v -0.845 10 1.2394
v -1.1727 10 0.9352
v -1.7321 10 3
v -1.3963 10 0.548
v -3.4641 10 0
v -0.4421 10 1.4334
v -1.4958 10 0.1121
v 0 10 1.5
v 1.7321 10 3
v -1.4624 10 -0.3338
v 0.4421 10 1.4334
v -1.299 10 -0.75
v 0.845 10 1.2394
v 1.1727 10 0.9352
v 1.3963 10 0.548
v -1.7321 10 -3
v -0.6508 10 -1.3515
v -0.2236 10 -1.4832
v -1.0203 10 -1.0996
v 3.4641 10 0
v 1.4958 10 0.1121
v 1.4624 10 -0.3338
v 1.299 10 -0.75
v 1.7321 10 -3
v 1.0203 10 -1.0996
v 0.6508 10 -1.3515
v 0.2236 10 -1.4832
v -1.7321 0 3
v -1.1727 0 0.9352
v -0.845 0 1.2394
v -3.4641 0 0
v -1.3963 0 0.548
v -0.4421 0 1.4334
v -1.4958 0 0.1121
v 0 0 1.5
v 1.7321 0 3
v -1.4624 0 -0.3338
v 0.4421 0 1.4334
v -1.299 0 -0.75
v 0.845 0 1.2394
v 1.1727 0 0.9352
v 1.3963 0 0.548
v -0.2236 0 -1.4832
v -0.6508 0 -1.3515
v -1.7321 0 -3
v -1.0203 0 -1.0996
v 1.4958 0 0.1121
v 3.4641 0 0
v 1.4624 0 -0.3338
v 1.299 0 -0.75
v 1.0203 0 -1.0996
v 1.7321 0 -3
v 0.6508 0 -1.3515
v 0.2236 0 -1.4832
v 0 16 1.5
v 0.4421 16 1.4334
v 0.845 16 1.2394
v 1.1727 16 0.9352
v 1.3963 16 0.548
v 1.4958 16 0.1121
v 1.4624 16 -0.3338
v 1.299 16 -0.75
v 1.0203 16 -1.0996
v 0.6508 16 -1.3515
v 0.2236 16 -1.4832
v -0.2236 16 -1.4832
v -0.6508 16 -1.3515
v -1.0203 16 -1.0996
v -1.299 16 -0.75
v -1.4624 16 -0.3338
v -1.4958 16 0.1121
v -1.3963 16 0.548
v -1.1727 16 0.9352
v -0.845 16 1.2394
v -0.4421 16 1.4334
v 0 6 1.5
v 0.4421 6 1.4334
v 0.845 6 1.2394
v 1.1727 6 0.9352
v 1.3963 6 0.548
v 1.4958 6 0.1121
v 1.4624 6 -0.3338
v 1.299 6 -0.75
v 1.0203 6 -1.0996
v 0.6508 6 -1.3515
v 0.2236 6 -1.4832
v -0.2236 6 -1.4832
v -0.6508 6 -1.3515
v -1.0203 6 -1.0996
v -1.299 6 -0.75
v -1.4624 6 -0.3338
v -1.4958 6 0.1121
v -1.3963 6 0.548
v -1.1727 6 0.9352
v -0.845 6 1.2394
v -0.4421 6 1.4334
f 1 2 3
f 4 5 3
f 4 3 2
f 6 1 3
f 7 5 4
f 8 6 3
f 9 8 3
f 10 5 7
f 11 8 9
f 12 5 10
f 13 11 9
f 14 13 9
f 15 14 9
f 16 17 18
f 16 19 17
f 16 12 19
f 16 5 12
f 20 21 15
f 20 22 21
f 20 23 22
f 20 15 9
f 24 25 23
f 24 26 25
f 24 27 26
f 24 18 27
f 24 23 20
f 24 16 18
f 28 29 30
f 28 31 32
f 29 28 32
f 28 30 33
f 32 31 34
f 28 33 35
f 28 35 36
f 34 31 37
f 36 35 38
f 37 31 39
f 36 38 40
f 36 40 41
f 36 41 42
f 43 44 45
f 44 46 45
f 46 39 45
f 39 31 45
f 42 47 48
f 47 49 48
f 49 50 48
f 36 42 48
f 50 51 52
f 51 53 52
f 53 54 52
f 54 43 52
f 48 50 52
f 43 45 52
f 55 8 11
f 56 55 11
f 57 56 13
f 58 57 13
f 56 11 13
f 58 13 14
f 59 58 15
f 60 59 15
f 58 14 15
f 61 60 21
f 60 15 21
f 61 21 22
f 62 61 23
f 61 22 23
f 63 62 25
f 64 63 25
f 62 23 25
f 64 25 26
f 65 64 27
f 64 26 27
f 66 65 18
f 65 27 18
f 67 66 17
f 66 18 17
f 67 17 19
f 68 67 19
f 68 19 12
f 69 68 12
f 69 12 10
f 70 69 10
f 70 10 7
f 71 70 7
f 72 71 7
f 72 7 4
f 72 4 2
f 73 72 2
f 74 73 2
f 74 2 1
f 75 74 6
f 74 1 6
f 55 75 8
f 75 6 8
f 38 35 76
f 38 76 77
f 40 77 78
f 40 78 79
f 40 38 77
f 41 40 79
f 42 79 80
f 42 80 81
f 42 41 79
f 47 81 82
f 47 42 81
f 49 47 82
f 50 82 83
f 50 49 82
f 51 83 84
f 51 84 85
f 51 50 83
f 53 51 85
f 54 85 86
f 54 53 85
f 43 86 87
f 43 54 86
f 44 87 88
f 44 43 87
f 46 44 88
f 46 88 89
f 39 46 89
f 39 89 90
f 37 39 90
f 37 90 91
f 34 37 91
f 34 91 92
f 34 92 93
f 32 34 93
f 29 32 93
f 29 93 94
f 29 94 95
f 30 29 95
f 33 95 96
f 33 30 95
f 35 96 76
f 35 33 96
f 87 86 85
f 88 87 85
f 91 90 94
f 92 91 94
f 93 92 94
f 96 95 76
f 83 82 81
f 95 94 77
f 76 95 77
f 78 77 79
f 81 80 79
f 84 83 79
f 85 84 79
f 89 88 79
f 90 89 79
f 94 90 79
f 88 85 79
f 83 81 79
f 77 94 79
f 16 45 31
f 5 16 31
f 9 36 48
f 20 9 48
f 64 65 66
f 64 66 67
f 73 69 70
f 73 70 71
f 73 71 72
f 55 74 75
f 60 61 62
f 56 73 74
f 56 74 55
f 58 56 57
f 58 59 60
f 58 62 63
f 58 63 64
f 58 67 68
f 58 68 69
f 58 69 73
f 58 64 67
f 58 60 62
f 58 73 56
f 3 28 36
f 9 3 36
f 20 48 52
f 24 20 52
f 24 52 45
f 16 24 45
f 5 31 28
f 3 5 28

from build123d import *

# Parameters (mm, degrees)
BOSS_EXTRUDE1_DEPTH = 10
SKETCH2_R           = 1.5
BOSS_EXTRUDE2_DEPTH = 6
CUT_EXTRUDE1_START  = -10
SKETCH2_2_R         = 1.5
CUT_EXTRUDE1_DEPTH  = 6


with BuildPart() as part:
    # Sketch1 → Boss-Extrude1 (new body)
    with BuildSketch(Plane(origin=(0, 0, 0), x_dir=(1, 0, 0), z_dir=(0, 1, 0))):
        Polygon((1.732050808, -3), (3.464101615, 0), (1.732050808, 3), (-1.732050808, 3), (-3.464101615, 0), (-1.732050808, -3), align=None)
    extrude(amount=BOSS_EXTRUDE1_DEPTH)

    # Sketch2 → Boss-Extrude2 (add)
    with BuildSketch(Plane(origin=(0, 10, 0), x_dir=(1, 0, 0), z_dir=(0, 1, 0))):
        with Locations(Location((0, 0, 0), (0, 0, 270))):
            Circle(SKETCH2_R)
    extrude(amount=BOSS_EXTRUDE2_DEPTH)

    # Sketch2<2> → Cut-Extrude1 (cut)
    with BuildSketch(Plane(origin=(0, 10, 0), x_dir=(1, 0, 0), z_dir=(0, 1, 0)).offset(CUT_EXTRUDE1_START)):
        with Locations(Location((0, 0, 0), (0, 0, 270))):
            Circle(SKETCH2_2_R)
    extrude(amount=CUT_EXTRUDE1_DEPTH, mode=Mode.SUBTRACT)


solid = part.part
